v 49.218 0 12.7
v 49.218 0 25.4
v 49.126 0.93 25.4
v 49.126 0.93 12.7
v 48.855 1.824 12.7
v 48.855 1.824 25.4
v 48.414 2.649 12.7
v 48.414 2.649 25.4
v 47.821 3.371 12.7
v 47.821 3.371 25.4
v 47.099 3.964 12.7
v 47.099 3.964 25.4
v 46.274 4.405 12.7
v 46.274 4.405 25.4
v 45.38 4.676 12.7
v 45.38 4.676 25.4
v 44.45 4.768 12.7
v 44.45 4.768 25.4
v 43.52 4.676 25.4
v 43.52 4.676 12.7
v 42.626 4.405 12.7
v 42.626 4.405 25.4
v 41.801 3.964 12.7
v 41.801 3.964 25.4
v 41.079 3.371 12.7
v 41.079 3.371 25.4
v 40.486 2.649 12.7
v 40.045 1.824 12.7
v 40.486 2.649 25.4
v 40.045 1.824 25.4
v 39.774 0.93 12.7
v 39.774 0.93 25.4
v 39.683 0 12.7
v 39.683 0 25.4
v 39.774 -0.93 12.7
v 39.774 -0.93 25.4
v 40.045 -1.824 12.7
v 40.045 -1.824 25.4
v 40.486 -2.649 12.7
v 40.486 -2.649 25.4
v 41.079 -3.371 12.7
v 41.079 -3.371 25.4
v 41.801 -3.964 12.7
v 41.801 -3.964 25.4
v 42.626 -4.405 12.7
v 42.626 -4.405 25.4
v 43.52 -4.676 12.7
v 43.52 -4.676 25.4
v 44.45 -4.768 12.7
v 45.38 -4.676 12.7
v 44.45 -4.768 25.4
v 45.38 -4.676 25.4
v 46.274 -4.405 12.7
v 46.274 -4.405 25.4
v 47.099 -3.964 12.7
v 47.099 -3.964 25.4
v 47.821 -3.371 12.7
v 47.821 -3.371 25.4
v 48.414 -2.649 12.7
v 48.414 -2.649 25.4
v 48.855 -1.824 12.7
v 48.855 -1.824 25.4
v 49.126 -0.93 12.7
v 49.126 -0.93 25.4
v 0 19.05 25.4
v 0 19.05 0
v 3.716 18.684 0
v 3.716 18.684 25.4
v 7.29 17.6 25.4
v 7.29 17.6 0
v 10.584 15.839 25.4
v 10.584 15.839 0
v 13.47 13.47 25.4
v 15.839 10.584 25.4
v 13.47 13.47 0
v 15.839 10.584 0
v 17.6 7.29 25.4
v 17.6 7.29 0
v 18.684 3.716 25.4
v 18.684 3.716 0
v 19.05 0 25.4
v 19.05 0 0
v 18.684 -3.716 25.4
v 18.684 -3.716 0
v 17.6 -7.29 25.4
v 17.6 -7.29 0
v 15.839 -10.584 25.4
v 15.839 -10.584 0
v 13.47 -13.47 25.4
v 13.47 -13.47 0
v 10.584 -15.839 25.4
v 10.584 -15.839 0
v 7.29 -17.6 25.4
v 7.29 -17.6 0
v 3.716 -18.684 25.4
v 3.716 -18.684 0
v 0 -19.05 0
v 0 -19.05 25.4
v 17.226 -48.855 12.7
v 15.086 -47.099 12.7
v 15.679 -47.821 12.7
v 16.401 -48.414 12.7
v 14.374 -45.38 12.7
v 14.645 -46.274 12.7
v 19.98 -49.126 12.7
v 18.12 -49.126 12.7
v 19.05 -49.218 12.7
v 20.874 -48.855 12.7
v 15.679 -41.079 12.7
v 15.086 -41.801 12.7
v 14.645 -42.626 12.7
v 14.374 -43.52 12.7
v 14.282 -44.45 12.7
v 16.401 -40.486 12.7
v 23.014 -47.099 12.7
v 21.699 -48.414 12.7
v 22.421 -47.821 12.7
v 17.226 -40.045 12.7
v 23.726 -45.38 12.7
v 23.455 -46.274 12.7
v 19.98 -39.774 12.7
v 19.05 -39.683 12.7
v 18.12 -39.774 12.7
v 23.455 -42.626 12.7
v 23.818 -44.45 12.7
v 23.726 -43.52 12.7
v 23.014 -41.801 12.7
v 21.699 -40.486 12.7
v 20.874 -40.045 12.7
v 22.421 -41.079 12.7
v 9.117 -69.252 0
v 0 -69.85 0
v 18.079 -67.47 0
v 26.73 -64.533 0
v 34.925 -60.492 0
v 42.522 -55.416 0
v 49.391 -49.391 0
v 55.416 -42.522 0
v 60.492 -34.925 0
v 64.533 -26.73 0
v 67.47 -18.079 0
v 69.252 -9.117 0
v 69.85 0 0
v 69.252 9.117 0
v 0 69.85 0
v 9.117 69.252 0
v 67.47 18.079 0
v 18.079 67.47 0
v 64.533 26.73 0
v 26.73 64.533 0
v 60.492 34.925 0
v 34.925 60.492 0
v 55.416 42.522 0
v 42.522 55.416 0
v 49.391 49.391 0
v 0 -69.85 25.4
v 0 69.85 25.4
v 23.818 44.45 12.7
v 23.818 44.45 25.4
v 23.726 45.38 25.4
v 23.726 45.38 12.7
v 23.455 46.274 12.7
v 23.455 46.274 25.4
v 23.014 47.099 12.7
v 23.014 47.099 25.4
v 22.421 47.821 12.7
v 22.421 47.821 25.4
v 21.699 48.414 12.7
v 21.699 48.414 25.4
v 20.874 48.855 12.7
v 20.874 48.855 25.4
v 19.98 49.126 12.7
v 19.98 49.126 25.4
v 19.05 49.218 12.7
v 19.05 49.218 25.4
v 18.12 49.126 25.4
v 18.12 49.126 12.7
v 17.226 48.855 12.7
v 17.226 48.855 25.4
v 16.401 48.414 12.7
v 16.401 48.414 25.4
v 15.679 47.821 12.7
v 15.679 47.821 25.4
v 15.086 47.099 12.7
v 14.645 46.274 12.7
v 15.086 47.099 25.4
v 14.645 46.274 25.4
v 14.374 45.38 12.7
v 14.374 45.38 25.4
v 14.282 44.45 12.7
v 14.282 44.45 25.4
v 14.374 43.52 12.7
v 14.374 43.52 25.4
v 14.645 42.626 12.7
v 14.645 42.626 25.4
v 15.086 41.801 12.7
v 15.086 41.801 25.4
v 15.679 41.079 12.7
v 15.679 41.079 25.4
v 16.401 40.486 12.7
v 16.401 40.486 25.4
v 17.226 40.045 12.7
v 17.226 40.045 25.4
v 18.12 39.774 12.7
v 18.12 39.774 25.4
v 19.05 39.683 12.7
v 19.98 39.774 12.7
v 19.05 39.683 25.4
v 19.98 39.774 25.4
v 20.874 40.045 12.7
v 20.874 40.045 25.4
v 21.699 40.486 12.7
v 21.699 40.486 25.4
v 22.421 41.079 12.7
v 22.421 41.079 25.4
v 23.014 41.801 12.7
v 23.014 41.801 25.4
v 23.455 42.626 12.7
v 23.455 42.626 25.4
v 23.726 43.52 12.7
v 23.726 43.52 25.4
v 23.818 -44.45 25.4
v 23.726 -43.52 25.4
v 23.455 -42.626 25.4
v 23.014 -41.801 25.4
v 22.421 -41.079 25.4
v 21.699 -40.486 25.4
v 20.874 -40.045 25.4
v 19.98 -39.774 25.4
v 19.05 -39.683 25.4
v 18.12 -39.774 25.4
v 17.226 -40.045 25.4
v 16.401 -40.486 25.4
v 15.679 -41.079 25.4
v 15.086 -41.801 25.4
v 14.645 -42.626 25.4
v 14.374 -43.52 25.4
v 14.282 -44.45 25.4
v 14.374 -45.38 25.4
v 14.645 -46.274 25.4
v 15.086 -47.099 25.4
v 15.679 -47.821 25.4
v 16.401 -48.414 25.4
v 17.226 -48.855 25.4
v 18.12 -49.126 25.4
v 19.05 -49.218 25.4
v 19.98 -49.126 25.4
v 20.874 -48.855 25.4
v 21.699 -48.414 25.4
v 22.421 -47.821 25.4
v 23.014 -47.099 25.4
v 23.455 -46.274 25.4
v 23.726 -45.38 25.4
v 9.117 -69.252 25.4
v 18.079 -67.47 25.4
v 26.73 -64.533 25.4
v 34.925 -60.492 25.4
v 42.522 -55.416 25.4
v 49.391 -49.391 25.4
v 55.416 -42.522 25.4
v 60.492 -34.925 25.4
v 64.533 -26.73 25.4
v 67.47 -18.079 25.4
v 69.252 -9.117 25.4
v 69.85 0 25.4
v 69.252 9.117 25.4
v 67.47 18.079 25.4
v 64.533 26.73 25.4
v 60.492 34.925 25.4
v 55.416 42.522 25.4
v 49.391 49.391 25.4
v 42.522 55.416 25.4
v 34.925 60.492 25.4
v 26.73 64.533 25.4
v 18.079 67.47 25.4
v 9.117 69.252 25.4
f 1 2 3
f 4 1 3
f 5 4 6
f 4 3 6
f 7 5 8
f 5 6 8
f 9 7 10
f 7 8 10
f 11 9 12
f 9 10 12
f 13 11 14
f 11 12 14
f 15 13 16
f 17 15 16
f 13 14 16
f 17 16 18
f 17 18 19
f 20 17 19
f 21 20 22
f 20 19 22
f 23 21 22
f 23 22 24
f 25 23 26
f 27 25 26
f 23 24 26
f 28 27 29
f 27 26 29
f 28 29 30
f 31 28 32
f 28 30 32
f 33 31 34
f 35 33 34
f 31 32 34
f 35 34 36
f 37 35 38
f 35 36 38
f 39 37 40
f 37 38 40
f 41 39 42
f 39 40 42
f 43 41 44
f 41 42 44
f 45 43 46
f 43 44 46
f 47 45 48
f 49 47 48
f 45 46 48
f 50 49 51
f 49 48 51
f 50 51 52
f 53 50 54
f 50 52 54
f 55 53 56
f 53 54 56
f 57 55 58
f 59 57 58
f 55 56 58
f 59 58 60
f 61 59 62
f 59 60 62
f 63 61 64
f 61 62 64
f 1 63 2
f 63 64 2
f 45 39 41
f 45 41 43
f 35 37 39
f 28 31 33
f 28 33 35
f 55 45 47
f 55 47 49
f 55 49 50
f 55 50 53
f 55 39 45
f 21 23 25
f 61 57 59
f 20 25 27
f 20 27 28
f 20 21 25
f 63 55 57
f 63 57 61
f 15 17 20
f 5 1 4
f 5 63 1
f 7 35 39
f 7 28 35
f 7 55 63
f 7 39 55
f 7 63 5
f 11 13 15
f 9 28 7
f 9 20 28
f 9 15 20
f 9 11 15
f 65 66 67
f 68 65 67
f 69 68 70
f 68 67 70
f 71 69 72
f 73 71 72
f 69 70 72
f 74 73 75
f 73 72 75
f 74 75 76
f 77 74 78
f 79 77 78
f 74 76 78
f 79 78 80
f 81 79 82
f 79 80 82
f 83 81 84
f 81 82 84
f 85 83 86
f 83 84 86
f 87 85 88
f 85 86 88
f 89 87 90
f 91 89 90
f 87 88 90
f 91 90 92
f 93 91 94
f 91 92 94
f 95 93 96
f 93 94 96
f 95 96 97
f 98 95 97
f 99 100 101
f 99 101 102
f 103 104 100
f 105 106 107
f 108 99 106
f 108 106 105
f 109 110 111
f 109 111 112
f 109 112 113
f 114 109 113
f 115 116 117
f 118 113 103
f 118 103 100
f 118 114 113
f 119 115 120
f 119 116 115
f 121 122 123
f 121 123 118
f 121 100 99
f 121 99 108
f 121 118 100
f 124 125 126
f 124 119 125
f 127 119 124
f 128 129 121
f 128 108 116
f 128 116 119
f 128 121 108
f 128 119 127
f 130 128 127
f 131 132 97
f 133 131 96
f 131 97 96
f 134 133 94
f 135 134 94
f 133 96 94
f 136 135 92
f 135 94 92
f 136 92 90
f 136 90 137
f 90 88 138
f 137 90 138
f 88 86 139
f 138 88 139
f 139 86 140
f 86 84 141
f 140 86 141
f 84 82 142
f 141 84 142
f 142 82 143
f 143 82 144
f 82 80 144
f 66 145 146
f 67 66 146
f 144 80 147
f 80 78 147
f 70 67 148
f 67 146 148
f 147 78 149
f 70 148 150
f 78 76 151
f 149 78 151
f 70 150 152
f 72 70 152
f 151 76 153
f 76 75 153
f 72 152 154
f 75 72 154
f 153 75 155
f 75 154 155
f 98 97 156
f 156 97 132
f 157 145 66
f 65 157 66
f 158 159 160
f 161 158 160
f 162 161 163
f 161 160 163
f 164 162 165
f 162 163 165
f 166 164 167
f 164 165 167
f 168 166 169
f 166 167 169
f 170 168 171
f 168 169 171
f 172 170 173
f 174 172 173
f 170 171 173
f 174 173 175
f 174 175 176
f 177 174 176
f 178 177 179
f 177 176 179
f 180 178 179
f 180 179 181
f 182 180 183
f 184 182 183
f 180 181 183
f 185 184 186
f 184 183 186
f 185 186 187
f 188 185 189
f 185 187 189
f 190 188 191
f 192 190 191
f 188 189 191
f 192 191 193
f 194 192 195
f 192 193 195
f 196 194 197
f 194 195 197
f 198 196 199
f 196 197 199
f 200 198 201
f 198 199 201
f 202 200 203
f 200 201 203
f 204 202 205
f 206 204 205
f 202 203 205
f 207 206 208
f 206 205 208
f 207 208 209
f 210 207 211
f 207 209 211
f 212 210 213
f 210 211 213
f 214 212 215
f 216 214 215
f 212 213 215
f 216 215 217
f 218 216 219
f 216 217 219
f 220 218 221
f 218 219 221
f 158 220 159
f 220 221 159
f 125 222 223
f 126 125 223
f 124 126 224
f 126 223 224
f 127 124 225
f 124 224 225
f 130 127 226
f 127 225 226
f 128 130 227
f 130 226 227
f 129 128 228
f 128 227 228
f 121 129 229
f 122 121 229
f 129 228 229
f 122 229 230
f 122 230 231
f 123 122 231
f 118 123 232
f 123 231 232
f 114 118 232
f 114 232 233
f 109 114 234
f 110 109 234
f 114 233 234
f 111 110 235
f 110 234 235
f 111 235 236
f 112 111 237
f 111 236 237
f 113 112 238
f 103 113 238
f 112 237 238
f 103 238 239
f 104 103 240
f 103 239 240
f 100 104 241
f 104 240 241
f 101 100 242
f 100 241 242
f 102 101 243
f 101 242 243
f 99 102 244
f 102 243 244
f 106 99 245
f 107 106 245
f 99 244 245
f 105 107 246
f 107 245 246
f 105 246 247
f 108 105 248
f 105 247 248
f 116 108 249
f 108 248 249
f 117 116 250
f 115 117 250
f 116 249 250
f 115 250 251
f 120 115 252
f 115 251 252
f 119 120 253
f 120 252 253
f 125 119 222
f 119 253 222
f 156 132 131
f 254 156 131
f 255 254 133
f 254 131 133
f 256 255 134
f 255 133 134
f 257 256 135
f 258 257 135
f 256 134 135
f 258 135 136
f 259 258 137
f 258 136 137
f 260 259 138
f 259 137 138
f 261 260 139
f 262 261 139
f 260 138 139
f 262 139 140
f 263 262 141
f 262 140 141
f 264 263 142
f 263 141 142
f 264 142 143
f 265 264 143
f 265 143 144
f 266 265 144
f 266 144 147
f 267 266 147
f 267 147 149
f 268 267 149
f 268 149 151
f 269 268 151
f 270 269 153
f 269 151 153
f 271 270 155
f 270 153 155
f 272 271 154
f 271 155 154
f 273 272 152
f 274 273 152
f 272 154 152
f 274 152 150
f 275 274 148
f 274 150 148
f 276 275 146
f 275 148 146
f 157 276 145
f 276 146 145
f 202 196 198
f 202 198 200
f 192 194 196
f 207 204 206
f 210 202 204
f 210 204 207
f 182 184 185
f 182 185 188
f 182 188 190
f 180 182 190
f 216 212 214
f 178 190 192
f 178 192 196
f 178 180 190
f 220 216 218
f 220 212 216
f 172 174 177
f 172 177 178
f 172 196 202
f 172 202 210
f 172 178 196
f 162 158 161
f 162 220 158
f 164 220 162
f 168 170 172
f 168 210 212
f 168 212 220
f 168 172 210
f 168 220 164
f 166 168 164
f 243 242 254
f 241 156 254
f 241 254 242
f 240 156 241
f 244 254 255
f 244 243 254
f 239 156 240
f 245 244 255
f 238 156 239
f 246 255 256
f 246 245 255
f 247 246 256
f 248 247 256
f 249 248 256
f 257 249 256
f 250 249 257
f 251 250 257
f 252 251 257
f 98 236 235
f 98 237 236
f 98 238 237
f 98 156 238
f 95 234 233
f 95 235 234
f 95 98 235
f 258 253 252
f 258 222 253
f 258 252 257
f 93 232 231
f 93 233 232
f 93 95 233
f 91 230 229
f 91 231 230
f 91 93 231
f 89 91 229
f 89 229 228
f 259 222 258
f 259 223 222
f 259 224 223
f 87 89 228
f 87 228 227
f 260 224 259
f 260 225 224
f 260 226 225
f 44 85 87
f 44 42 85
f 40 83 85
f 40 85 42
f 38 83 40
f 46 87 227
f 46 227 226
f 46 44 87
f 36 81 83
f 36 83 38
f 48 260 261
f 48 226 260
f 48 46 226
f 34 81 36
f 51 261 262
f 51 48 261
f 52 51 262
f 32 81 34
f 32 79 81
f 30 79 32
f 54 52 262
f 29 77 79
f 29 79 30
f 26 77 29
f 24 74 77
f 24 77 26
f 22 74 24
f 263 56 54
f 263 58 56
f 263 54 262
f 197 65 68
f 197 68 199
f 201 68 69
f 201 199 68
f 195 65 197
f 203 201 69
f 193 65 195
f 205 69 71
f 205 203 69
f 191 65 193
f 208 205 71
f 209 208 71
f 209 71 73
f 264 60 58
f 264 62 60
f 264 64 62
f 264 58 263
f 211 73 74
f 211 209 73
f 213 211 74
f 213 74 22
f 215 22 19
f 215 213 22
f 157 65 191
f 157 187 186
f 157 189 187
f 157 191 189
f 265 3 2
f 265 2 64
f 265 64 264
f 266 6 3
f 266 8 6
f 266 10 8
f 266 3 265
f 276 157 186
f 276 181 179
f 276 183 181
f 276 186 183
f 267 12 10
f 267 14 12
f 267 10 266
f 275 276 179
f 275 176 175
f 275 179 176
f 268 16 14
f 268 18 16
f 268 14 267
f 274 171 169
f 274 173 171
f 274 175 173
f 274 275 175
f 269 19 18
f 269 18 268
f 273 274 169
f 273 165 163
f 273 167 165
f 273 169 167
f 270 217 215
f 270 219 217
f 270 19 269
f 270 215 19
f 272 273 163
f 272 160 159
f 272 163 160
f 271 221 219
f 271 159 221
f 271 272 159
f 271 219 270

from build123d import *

# Parameters (mm, degrees)
F1_DEPTH = 25.4
F2_R     = 4.7675
F3_DEPTH = 12.7


with BuildPart() as f1:
    # F0 (on Top) → F1 (new body)
    with BuildSketch(Plane.XY):
        with BuildLine():
            Line((0, -19.05), (0, -69.85))
            ThreePointArc((0, -69.85), (69.85, 0), (0, 69.85))
            Line((0, 69.85), (0, 19.05))
            ThreePointArc((0, 19.05), (19.05, 0), (0, -19.05))
        make_face()
    extrude(amount=F1_DEPTH)

    # F2 (on face) → F3 (cut)
    with BuildSketch(Plane.XY.offset(25.4)):
        with Locations((19.05, 44.45)):
            Circle(F2_R)
        with Locations((19.05, -44.45)):
            Circle(F2_R)
        with Locations((44.45, 0)):
            Circle(F2_R)
    extrude(amount=-F3_DEPTH, mode=Mode.SUBTRACT)


solid = f1.part
